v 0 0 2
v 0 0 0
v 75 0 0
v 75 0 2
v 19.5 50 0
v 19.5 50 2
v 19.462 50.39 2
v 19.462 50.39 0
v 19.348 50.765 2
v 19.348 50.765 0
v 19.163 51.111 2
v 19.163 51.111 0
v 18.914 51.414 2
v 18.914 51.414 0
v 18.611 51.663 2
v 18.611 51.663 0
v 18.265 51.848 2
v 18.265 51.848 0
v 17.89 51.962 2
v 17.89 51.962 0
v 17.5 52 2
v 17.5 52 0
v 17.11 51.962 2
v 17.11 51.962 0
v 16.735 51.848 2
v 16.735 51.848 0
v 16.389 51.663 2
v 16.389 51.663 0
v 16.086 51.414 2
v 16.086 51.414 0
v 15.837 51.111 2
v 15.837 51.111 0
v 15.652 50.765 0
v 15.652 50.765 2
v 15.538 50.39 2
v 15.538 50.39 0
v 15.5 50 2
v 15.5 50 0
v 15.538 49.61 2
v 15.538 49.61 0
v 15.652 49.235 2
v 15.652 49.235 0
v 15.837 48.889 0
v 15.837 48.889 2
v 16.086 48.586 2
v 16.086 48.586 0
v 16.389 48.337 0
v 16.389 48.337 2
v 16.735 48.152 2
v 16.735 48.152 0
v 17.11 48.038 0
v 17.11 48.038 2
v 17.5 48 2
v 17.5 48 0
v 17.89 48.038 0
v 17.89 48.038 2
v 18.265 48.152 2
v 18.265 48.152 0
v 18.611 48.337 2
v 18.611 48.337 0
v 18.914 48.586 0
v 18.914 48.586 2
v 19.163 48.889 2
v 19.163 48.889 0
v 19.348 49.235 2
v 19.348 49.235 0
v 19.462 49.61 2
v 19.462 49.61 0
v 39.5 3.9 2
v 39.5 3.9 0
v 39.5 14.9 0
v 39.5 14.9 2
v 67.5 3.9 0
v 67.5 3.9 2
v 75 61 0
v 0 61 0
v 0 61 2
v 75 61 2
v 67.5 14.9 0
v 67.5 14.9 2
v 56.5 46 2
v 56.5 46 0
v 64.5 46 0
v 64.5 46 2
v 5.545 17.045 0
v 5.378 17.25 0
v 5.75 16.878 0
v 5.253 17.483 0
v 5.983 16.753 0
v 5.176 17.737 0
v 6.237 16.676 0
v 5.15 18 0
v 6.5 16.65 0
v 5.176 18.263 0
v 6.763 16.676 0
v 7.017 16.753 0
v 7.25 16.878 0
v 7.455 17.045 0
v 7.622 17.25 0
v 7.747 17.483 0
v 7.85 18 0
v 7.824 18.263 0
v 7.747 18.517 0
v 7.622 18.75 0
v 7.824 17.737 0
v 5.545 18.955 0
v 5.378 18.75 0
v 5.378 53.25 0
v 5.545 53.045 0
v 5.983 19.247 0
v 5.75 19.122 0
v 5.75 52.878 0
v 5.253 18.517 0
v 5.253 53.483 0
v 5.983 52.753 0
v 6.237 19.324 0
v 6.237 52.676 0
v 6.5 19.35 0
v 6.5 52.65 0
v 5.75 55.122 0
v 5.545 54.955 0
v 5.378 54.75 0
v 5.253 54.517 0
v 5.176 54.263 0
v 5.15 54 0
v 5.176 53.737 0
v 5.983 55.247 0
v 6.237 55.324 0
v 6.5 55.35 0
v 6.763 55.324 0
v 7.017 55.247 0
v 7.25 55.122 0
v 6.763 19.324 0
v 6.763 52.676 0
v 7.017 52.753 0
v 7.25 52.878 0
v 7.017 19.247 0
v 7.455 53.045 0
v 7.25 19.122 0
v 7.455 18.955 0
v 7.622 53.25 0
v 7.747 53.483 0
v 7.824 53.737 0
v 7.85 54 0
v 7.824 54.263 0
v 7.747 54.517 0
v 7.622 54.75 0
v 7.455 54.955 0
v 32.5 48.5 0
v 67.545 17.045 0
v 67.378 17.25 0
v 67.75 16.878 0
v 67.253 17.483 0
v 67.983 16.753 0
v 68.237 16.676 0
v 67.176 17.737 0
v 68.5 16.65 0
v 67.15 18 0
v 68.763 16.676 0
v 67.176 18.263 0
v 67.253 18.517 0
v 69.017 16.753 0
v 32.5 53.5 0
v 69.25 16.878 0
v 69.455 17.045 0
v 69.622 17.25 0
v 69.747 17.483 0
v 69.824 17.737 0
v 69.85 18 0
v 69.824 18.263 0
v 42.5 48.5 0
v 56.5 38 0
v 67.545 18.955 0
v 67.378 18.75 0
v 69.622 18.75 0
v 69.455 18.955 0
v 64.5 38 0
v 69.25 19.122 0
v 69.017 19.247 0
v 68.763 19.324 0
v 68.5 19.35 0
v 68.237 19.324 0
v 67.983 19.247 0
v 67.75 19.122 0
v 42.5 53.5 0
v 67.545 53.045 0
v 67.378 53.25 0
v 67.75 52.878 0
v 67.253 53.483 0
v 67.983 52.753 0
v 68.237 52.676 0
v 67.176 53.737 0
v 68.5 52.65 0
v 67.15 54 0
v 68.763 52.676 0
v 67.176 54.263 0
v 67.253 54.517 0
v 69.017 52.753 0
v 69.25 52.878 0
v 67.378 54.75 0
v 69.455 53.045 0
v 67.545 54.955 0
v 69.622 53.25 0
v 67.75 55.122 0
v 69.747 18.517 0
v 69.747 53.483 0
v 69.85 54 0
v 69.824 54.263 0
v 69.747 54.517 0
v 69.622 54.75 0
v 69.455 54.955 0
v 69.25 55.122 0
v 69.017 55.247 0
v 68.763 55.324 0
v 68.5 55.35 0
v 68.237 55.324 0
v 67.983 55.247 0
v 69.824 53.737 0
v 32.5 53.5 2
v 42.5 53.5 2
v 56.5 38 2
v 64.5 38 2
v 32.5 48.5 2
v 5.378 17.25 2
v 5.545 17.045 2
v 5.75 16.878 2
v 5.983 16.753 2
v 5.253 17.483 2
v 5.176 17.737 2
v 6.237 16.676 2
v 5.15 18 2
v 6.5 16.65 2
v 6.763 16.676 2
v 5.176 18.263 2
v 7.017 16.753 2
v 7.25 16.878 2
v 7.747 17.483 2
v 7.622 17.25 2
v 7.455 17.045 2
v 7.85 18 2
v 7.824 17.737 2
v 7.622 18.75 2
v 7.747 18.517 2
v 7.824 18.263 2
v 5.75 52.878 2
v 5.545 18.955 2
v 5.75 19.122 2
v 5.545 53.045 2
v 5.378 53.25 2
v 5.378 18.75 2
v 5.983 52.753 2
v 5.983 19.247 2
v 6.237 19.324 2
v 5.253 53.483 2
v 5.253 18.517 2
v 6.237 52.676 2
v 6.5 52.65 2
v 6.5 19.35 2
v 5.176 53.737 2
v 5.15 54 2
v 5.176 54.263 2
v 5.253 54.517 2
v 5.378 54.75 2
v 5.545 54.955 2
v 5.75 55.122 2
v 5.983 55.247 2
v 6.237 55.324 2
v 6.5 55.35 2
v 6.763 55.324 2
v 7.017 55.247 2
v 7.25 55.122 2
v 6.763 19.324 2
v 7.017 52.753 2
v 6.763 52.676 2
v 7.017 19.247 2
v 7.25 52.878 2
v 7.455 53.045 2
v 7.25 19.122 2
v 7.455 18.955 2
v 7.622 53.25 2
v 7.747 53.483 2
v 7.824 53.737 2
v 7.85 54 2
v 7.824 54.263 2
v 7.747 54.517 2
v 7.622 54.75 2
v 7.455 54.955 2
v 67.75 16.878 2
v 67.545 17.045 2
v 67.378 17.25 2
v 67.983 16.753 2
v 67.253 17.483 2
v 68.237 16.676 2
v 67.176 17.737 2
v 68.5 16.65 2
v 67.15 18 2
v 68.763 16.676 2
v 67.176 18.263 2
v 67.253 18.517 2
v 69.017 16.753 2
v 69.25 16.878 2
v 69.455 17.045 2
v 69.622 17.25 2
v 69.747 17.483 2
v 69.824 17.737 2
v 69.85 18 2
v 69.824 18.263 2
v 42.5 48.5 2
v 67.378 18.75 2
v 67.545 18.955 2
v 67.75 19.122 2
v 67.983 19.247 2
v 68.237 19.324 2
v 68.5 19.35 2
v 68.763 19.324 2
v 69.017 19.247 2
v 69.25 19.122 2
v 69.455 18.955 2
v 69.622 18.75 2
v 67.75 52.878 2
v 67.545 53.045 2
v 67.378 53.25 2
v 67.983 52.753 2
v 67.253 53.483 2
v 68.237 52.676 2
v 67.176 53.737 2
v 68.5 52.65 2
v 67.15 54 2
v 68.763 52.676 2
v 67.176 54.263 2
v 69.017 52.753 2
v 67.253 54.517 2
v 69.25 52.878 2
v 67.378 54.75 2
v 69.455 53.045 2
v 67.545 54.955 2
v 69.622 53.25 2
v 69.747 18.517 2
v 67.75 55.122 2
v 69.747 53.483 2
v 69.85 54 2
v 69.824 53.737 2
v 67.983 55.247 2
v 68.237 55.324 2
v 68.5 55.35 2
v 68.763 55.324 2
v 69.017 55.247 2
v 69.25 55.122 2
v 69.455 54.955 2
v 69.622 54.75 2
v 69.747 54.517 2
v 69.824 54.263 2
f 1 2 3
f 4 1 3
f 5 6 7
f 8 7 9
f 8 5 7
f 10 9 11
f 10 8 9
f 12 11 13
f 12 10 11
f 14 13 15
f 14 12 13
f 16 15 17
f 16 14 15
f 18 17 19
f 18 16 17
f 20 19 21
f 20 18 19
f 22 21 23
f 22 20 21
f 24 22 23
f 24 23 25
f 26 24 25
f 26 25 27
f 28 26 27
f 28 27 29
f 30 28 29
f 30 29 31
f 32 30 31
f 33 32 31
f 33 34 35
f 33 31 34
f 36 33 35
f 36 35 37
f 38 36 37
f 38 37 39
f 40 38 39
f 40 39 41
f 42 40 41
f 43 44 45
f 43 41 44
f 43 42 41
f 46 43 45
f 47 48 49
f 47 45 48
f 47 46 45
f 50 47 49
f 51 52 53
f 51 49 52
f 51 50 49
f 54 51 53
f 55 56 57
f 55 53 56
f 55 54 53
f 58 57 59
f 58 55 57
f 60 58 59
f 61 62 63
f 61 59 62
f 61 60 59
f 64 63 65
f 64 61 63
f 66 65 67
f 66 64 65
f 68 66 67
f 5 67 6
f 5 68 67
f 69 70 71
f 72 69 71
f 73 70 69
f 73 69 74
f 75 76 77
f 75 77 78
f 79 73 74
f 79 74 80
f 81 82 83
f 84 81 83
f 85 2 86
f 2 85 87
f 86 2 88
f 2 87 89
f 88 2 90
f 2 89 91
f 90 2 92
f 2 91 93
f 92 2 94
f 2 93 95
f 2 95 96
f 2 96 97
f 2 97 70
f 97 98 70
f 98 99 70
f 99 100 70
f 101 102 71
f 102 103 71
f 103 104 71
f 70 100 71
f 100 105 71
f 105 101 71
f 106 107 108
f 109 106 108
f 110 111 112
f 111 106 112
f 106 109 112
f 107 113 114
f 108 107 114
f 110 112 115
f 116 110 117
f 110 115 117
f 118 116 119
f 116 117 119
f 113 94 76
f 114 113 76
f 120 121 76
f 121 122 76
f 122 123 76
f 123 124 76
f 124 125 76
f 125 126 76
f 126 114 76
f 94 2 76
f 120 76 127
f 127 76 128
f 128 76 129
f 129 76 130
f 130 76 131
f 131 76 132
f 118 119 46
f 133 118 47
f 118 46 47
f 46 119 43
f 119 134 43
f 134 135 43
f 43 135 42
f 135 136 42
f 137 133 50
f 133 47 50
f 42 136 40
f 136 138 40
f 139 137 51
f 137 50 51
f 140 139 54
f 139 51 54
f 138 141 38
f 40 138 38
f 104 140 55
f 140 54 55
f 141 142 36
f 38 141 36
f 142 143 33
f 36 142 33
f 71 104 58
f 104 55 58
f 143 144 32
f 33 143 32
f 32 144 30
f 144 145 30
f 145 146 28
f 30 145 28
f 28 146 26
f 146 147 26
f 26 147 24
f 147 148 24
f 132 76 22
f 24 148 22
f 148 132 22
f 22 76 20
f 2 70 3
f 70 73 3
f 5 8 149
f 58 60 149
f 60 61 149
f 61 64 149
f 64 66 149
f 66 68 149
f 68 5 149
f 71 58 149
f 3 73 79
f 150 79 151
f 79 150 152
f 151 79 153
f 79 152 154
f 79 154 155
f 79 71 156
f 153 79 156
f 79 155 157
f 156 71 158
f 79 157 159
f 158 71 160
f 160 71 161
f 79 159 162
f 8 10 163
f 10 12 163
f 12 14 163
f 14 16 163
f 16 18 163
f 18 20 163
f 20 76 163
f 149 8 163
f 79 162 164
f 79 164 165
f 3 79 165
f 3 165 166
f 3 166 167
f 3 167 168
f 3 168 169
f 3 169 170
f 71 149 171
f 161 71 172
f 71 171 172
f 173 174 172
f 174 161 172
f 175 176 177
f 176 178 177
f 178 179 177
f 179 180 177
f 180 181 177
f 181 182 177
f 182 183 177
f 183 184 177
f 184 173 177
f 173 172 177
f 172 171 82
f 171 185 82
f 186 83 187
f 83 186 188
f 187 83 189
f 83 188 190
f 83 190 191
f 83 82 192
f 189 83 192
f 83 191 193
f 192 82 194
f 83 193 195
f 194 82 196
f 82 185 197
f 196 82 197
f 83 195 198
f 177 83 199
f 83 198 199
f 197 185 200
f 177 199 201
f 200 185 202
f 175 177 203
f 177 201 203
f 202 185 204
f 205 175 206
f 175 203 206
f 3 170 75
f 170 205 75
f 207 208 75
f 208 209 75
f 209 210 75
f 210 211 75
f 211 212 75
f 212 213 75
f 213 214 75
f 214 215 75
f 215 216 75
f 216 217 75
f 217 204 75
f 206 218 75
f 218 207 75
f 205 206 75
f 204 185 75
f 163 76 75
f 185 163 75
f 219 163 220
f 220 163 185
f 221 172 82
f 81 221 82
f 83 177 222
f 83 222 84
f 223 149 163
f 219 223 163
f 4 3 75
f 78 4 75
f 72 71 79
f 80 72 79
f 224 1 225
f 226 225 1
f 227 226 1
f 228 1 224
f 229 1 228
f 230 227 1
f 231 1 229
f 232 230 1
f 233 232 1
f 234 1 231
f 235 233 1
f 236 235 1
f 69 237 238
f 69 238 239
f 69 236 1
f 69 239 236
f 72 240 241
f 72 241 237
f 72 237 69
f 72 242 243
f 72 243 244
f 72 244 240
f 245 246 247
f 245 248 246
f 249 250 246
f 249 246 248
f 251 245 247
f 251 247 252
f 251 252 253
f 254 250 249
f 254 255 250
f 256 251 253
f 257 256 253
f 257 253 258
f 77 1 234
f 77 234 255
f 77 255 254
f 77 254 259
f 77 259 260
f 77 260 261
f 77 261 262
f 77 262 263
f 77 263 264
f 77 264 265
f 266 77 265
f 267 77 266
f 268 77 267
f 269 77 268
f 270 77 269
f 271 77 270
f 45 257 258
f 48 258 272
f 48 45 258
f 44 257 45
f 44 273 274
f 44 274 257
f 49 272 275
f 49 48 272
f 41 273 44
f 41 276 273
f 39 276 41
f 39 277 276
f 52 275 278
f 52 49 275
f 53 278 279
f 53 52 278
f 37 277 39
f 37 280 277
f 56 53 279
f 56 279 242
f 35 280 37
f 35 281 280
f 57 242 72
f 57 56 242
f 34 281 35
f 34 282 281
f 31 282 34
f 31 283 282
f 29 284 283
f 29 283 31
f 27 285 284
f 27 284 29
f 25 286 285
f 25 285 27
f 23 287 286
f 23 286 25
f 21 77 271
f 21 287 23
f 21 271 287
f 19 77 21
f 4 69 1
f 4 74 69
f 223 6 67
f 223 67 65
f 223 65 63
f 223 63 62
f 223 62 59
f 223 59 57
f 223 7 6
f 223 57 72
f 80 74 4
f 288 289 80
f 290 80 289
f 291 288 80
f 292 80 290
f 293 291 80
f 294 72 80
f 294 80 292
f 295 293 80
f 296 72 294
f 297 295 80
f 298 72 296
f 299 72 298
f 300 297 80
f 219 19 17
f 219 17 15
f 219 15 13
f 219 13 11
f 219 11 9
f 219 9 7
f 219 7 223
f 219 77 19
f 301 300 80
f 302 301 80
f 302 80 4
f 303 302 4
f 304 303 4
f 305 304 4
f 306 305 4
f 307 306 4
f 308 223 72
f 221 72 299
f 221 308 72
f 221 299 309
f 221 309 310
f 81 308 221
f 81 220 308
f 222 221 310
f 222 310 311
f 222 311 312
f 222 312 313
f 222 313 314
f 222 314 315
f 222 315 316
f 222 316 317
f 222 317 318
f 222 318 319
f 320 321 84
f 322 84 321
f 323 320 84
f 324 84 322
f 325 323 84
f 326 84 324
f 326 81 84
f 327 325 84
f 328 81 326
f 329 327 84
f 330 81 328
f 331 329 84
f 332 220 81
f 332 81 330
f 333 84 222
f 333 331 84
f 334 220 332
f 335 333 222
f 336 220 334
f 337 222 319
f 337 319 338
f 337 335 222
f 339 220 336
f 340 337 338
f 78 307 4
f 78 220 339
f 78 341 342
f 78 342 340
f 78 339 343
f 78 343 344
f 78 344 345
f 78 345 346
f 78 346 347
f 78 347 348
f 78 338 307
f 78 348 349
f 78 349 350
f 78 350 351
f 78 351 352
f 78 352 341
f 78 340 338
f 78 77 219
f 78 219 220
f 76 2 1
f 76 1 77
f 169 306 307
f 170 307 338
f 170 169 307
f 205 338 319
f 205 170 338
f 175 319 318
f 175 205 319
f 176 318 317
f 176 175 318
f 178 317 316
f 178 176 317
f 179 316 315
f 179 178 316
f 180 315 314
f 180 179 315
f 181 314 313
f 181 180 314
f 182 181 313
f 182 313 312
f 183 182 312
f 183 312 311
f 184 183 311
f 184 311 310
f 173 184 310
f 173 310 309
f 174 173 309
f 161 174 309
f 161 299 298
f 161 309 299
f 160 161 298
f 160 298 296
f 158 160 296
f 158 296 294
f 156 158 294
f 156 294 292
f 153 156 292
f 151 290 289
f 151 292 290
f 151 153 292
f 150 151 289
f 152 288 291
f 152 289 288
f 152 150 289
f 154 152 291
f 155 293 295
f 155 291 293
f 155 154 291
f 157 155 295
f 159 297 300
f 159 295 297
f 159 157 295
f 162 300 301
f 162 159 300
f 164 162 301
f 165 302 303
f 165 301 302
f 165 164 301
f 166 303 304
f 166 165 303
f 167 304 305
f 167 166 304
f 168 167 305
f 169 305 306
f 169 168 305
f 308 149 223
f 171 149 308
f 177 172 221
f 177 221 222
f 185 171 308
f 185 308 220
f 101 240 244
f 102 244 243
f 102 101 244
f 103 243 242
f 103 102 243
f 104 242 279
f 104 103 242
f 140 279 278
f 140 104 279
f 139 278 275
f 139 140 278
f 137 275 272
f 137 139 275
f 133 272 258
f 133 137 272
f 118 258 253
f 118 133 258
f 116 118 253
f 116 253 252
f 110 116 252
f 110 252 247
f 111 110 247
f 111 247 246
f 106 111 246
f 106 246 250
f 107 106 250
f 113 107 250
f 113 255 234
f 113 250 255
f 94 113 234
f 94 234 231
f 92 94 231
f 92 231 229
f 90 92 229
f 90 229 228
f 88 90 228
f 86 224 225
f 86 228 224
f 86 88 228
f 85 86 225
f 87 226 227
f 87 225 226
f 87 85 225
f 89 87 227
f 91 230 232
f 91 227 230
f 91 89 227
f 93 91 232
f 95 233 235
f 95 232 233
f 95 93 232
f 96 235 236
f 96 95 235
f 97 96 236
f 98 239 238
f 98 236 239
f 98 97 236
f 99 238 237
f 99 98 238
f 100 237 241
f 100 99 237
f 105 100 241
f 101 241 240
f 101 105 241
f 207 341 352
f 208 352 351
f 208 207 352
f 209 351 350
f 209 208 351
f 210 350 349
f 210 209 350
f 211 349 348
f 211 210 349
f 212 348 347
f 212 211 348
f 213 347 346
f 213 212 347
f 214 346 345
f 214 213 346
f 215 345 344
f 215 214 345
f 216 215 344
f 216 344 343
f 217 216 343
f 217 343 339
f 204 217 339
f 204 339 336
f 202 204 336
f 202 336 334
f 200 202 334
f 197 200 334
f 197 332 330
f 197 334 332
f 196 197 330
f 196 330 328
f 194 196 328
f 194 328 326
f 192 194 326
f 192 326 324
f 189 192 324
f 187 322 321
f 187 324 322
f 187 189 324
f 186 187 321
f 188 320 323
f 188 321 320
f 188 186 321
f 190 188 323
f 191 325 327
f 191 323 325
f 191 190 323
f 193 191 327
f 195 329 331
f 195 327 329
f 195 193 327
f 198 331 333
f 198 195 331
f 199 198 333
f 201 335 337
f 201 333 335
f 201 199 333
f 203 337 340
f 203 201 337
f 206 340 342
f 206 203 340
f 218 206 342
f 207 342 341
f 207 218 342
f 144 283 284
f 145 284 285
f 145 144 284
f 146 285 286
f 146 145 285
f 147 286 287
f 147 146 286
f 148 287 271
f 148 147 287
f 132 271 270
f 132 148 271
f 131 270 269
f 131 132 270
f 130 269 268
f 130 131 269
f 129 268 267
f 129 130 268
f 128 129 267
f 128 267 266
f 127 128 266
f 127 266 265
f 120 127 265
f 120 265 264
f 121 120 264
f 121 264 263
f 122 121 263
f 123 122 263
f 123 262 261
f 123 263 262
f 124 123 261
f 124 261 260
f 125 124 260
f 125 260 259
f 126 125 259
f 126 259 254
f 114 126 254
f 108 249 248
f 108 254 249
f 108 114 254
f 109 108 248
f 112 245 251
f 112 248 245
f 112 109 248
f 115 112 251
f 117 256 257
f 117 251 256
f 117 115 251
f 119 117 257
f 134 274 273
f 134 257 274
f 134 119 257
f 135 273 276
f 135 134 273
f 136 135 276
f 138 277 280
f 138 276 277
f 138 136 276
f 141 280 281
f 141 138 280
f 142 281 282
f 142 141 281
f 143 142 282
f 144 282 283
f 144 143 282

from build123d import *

# Parameters (mm, degrees)
SKETCH_1_W          = 75
SKETCH_1_H          = 61
EXTRUDE_1_DEPTH     = 2
SKETCH_2_W          = 28
SKETCH_2_H          = 11
CUT_EXTRUDE_1_DEPTH = 97.695398029
SKETCH_3_W          = 10
SKETCH_3_H          = 5
SKETCH_3_W_2        = 8
SKETCH_3_H_2        = 8
CUT_EXTRUDE_2_DEPTH = 97.695398029
SKETCH_4_R          = 1.35
CUT_EXTRUDE_3_DEPTH = 97.695398029
SKETCH_5_R          = 2
CUT_EXTRUDE_4_DEPTH = 97.695398029


with BuildPart() as part:
    # 草图1 → 凸台-拉伸1 (new body)
    with BuildSketch(Plane.XY):
        with Locations((37.5, 30.5)):
            Rectangle(SKETCH_1_W, SKETCH_1_H)
    extrude(amount=EXTRUDE_1_DEPTH)

    # 草图2 → 切除-拉伸1 (cut, through all)
    with BuildSketch(Plane.XY):
        with Locations((53.5, 9.4)):
            Rectangle(SKETCH_2_W, SKETCH_2_H)
    extrude(amount=CUT_EXTRUDE_1_DEPTH, mode=Mode.SUBTRACT)

    # 草图3 → 切除-拉伸2 (cut, through all)
    with BuildSketch(Plane.XY):
        with Locations((37.5, 51)):
            Rectangle(SKETCH_3_W, SKETCH_3_H)
        with Locations((60.5, 42)):
            Rectangle(SKETCH_3_W_2, SKETCH_3_H_2)
    extrude(amount=CUT_EXTRUDE_2_DEPTH, mode=Mode.SUBTRACT)

    # 草图4 → 切除-拉伸3 (cut, through all)
    with BuildSketch(Plane.XY):
        with Locations((6.5, 18)):
            Circle(SKETCH_4_R)
        with Locations((68.5, 18)):
            Circle(SKETCH_4_R)
        with Locations((6.5, 54)):
            Circle(SKETCH_4_R)
        with Locations((68.5, 54)):
            Circle(SKETCH_4_R)
    extrude(amount=CUT_EXTRUDE_3_DEPTH, mode=Mode.SUBTRACT)

    # 草图5 → 切除-拉伸4 (cut, through all)
    with BuildSketch(Plane.XY):
        with Locations((17.5, 50)):
            Circle(SKETCH_5_R)
    extrude(amount=CUT_EXTRUDE_4_DEPTH, mode=Mode.SUBTRACT)


solid = part.part
